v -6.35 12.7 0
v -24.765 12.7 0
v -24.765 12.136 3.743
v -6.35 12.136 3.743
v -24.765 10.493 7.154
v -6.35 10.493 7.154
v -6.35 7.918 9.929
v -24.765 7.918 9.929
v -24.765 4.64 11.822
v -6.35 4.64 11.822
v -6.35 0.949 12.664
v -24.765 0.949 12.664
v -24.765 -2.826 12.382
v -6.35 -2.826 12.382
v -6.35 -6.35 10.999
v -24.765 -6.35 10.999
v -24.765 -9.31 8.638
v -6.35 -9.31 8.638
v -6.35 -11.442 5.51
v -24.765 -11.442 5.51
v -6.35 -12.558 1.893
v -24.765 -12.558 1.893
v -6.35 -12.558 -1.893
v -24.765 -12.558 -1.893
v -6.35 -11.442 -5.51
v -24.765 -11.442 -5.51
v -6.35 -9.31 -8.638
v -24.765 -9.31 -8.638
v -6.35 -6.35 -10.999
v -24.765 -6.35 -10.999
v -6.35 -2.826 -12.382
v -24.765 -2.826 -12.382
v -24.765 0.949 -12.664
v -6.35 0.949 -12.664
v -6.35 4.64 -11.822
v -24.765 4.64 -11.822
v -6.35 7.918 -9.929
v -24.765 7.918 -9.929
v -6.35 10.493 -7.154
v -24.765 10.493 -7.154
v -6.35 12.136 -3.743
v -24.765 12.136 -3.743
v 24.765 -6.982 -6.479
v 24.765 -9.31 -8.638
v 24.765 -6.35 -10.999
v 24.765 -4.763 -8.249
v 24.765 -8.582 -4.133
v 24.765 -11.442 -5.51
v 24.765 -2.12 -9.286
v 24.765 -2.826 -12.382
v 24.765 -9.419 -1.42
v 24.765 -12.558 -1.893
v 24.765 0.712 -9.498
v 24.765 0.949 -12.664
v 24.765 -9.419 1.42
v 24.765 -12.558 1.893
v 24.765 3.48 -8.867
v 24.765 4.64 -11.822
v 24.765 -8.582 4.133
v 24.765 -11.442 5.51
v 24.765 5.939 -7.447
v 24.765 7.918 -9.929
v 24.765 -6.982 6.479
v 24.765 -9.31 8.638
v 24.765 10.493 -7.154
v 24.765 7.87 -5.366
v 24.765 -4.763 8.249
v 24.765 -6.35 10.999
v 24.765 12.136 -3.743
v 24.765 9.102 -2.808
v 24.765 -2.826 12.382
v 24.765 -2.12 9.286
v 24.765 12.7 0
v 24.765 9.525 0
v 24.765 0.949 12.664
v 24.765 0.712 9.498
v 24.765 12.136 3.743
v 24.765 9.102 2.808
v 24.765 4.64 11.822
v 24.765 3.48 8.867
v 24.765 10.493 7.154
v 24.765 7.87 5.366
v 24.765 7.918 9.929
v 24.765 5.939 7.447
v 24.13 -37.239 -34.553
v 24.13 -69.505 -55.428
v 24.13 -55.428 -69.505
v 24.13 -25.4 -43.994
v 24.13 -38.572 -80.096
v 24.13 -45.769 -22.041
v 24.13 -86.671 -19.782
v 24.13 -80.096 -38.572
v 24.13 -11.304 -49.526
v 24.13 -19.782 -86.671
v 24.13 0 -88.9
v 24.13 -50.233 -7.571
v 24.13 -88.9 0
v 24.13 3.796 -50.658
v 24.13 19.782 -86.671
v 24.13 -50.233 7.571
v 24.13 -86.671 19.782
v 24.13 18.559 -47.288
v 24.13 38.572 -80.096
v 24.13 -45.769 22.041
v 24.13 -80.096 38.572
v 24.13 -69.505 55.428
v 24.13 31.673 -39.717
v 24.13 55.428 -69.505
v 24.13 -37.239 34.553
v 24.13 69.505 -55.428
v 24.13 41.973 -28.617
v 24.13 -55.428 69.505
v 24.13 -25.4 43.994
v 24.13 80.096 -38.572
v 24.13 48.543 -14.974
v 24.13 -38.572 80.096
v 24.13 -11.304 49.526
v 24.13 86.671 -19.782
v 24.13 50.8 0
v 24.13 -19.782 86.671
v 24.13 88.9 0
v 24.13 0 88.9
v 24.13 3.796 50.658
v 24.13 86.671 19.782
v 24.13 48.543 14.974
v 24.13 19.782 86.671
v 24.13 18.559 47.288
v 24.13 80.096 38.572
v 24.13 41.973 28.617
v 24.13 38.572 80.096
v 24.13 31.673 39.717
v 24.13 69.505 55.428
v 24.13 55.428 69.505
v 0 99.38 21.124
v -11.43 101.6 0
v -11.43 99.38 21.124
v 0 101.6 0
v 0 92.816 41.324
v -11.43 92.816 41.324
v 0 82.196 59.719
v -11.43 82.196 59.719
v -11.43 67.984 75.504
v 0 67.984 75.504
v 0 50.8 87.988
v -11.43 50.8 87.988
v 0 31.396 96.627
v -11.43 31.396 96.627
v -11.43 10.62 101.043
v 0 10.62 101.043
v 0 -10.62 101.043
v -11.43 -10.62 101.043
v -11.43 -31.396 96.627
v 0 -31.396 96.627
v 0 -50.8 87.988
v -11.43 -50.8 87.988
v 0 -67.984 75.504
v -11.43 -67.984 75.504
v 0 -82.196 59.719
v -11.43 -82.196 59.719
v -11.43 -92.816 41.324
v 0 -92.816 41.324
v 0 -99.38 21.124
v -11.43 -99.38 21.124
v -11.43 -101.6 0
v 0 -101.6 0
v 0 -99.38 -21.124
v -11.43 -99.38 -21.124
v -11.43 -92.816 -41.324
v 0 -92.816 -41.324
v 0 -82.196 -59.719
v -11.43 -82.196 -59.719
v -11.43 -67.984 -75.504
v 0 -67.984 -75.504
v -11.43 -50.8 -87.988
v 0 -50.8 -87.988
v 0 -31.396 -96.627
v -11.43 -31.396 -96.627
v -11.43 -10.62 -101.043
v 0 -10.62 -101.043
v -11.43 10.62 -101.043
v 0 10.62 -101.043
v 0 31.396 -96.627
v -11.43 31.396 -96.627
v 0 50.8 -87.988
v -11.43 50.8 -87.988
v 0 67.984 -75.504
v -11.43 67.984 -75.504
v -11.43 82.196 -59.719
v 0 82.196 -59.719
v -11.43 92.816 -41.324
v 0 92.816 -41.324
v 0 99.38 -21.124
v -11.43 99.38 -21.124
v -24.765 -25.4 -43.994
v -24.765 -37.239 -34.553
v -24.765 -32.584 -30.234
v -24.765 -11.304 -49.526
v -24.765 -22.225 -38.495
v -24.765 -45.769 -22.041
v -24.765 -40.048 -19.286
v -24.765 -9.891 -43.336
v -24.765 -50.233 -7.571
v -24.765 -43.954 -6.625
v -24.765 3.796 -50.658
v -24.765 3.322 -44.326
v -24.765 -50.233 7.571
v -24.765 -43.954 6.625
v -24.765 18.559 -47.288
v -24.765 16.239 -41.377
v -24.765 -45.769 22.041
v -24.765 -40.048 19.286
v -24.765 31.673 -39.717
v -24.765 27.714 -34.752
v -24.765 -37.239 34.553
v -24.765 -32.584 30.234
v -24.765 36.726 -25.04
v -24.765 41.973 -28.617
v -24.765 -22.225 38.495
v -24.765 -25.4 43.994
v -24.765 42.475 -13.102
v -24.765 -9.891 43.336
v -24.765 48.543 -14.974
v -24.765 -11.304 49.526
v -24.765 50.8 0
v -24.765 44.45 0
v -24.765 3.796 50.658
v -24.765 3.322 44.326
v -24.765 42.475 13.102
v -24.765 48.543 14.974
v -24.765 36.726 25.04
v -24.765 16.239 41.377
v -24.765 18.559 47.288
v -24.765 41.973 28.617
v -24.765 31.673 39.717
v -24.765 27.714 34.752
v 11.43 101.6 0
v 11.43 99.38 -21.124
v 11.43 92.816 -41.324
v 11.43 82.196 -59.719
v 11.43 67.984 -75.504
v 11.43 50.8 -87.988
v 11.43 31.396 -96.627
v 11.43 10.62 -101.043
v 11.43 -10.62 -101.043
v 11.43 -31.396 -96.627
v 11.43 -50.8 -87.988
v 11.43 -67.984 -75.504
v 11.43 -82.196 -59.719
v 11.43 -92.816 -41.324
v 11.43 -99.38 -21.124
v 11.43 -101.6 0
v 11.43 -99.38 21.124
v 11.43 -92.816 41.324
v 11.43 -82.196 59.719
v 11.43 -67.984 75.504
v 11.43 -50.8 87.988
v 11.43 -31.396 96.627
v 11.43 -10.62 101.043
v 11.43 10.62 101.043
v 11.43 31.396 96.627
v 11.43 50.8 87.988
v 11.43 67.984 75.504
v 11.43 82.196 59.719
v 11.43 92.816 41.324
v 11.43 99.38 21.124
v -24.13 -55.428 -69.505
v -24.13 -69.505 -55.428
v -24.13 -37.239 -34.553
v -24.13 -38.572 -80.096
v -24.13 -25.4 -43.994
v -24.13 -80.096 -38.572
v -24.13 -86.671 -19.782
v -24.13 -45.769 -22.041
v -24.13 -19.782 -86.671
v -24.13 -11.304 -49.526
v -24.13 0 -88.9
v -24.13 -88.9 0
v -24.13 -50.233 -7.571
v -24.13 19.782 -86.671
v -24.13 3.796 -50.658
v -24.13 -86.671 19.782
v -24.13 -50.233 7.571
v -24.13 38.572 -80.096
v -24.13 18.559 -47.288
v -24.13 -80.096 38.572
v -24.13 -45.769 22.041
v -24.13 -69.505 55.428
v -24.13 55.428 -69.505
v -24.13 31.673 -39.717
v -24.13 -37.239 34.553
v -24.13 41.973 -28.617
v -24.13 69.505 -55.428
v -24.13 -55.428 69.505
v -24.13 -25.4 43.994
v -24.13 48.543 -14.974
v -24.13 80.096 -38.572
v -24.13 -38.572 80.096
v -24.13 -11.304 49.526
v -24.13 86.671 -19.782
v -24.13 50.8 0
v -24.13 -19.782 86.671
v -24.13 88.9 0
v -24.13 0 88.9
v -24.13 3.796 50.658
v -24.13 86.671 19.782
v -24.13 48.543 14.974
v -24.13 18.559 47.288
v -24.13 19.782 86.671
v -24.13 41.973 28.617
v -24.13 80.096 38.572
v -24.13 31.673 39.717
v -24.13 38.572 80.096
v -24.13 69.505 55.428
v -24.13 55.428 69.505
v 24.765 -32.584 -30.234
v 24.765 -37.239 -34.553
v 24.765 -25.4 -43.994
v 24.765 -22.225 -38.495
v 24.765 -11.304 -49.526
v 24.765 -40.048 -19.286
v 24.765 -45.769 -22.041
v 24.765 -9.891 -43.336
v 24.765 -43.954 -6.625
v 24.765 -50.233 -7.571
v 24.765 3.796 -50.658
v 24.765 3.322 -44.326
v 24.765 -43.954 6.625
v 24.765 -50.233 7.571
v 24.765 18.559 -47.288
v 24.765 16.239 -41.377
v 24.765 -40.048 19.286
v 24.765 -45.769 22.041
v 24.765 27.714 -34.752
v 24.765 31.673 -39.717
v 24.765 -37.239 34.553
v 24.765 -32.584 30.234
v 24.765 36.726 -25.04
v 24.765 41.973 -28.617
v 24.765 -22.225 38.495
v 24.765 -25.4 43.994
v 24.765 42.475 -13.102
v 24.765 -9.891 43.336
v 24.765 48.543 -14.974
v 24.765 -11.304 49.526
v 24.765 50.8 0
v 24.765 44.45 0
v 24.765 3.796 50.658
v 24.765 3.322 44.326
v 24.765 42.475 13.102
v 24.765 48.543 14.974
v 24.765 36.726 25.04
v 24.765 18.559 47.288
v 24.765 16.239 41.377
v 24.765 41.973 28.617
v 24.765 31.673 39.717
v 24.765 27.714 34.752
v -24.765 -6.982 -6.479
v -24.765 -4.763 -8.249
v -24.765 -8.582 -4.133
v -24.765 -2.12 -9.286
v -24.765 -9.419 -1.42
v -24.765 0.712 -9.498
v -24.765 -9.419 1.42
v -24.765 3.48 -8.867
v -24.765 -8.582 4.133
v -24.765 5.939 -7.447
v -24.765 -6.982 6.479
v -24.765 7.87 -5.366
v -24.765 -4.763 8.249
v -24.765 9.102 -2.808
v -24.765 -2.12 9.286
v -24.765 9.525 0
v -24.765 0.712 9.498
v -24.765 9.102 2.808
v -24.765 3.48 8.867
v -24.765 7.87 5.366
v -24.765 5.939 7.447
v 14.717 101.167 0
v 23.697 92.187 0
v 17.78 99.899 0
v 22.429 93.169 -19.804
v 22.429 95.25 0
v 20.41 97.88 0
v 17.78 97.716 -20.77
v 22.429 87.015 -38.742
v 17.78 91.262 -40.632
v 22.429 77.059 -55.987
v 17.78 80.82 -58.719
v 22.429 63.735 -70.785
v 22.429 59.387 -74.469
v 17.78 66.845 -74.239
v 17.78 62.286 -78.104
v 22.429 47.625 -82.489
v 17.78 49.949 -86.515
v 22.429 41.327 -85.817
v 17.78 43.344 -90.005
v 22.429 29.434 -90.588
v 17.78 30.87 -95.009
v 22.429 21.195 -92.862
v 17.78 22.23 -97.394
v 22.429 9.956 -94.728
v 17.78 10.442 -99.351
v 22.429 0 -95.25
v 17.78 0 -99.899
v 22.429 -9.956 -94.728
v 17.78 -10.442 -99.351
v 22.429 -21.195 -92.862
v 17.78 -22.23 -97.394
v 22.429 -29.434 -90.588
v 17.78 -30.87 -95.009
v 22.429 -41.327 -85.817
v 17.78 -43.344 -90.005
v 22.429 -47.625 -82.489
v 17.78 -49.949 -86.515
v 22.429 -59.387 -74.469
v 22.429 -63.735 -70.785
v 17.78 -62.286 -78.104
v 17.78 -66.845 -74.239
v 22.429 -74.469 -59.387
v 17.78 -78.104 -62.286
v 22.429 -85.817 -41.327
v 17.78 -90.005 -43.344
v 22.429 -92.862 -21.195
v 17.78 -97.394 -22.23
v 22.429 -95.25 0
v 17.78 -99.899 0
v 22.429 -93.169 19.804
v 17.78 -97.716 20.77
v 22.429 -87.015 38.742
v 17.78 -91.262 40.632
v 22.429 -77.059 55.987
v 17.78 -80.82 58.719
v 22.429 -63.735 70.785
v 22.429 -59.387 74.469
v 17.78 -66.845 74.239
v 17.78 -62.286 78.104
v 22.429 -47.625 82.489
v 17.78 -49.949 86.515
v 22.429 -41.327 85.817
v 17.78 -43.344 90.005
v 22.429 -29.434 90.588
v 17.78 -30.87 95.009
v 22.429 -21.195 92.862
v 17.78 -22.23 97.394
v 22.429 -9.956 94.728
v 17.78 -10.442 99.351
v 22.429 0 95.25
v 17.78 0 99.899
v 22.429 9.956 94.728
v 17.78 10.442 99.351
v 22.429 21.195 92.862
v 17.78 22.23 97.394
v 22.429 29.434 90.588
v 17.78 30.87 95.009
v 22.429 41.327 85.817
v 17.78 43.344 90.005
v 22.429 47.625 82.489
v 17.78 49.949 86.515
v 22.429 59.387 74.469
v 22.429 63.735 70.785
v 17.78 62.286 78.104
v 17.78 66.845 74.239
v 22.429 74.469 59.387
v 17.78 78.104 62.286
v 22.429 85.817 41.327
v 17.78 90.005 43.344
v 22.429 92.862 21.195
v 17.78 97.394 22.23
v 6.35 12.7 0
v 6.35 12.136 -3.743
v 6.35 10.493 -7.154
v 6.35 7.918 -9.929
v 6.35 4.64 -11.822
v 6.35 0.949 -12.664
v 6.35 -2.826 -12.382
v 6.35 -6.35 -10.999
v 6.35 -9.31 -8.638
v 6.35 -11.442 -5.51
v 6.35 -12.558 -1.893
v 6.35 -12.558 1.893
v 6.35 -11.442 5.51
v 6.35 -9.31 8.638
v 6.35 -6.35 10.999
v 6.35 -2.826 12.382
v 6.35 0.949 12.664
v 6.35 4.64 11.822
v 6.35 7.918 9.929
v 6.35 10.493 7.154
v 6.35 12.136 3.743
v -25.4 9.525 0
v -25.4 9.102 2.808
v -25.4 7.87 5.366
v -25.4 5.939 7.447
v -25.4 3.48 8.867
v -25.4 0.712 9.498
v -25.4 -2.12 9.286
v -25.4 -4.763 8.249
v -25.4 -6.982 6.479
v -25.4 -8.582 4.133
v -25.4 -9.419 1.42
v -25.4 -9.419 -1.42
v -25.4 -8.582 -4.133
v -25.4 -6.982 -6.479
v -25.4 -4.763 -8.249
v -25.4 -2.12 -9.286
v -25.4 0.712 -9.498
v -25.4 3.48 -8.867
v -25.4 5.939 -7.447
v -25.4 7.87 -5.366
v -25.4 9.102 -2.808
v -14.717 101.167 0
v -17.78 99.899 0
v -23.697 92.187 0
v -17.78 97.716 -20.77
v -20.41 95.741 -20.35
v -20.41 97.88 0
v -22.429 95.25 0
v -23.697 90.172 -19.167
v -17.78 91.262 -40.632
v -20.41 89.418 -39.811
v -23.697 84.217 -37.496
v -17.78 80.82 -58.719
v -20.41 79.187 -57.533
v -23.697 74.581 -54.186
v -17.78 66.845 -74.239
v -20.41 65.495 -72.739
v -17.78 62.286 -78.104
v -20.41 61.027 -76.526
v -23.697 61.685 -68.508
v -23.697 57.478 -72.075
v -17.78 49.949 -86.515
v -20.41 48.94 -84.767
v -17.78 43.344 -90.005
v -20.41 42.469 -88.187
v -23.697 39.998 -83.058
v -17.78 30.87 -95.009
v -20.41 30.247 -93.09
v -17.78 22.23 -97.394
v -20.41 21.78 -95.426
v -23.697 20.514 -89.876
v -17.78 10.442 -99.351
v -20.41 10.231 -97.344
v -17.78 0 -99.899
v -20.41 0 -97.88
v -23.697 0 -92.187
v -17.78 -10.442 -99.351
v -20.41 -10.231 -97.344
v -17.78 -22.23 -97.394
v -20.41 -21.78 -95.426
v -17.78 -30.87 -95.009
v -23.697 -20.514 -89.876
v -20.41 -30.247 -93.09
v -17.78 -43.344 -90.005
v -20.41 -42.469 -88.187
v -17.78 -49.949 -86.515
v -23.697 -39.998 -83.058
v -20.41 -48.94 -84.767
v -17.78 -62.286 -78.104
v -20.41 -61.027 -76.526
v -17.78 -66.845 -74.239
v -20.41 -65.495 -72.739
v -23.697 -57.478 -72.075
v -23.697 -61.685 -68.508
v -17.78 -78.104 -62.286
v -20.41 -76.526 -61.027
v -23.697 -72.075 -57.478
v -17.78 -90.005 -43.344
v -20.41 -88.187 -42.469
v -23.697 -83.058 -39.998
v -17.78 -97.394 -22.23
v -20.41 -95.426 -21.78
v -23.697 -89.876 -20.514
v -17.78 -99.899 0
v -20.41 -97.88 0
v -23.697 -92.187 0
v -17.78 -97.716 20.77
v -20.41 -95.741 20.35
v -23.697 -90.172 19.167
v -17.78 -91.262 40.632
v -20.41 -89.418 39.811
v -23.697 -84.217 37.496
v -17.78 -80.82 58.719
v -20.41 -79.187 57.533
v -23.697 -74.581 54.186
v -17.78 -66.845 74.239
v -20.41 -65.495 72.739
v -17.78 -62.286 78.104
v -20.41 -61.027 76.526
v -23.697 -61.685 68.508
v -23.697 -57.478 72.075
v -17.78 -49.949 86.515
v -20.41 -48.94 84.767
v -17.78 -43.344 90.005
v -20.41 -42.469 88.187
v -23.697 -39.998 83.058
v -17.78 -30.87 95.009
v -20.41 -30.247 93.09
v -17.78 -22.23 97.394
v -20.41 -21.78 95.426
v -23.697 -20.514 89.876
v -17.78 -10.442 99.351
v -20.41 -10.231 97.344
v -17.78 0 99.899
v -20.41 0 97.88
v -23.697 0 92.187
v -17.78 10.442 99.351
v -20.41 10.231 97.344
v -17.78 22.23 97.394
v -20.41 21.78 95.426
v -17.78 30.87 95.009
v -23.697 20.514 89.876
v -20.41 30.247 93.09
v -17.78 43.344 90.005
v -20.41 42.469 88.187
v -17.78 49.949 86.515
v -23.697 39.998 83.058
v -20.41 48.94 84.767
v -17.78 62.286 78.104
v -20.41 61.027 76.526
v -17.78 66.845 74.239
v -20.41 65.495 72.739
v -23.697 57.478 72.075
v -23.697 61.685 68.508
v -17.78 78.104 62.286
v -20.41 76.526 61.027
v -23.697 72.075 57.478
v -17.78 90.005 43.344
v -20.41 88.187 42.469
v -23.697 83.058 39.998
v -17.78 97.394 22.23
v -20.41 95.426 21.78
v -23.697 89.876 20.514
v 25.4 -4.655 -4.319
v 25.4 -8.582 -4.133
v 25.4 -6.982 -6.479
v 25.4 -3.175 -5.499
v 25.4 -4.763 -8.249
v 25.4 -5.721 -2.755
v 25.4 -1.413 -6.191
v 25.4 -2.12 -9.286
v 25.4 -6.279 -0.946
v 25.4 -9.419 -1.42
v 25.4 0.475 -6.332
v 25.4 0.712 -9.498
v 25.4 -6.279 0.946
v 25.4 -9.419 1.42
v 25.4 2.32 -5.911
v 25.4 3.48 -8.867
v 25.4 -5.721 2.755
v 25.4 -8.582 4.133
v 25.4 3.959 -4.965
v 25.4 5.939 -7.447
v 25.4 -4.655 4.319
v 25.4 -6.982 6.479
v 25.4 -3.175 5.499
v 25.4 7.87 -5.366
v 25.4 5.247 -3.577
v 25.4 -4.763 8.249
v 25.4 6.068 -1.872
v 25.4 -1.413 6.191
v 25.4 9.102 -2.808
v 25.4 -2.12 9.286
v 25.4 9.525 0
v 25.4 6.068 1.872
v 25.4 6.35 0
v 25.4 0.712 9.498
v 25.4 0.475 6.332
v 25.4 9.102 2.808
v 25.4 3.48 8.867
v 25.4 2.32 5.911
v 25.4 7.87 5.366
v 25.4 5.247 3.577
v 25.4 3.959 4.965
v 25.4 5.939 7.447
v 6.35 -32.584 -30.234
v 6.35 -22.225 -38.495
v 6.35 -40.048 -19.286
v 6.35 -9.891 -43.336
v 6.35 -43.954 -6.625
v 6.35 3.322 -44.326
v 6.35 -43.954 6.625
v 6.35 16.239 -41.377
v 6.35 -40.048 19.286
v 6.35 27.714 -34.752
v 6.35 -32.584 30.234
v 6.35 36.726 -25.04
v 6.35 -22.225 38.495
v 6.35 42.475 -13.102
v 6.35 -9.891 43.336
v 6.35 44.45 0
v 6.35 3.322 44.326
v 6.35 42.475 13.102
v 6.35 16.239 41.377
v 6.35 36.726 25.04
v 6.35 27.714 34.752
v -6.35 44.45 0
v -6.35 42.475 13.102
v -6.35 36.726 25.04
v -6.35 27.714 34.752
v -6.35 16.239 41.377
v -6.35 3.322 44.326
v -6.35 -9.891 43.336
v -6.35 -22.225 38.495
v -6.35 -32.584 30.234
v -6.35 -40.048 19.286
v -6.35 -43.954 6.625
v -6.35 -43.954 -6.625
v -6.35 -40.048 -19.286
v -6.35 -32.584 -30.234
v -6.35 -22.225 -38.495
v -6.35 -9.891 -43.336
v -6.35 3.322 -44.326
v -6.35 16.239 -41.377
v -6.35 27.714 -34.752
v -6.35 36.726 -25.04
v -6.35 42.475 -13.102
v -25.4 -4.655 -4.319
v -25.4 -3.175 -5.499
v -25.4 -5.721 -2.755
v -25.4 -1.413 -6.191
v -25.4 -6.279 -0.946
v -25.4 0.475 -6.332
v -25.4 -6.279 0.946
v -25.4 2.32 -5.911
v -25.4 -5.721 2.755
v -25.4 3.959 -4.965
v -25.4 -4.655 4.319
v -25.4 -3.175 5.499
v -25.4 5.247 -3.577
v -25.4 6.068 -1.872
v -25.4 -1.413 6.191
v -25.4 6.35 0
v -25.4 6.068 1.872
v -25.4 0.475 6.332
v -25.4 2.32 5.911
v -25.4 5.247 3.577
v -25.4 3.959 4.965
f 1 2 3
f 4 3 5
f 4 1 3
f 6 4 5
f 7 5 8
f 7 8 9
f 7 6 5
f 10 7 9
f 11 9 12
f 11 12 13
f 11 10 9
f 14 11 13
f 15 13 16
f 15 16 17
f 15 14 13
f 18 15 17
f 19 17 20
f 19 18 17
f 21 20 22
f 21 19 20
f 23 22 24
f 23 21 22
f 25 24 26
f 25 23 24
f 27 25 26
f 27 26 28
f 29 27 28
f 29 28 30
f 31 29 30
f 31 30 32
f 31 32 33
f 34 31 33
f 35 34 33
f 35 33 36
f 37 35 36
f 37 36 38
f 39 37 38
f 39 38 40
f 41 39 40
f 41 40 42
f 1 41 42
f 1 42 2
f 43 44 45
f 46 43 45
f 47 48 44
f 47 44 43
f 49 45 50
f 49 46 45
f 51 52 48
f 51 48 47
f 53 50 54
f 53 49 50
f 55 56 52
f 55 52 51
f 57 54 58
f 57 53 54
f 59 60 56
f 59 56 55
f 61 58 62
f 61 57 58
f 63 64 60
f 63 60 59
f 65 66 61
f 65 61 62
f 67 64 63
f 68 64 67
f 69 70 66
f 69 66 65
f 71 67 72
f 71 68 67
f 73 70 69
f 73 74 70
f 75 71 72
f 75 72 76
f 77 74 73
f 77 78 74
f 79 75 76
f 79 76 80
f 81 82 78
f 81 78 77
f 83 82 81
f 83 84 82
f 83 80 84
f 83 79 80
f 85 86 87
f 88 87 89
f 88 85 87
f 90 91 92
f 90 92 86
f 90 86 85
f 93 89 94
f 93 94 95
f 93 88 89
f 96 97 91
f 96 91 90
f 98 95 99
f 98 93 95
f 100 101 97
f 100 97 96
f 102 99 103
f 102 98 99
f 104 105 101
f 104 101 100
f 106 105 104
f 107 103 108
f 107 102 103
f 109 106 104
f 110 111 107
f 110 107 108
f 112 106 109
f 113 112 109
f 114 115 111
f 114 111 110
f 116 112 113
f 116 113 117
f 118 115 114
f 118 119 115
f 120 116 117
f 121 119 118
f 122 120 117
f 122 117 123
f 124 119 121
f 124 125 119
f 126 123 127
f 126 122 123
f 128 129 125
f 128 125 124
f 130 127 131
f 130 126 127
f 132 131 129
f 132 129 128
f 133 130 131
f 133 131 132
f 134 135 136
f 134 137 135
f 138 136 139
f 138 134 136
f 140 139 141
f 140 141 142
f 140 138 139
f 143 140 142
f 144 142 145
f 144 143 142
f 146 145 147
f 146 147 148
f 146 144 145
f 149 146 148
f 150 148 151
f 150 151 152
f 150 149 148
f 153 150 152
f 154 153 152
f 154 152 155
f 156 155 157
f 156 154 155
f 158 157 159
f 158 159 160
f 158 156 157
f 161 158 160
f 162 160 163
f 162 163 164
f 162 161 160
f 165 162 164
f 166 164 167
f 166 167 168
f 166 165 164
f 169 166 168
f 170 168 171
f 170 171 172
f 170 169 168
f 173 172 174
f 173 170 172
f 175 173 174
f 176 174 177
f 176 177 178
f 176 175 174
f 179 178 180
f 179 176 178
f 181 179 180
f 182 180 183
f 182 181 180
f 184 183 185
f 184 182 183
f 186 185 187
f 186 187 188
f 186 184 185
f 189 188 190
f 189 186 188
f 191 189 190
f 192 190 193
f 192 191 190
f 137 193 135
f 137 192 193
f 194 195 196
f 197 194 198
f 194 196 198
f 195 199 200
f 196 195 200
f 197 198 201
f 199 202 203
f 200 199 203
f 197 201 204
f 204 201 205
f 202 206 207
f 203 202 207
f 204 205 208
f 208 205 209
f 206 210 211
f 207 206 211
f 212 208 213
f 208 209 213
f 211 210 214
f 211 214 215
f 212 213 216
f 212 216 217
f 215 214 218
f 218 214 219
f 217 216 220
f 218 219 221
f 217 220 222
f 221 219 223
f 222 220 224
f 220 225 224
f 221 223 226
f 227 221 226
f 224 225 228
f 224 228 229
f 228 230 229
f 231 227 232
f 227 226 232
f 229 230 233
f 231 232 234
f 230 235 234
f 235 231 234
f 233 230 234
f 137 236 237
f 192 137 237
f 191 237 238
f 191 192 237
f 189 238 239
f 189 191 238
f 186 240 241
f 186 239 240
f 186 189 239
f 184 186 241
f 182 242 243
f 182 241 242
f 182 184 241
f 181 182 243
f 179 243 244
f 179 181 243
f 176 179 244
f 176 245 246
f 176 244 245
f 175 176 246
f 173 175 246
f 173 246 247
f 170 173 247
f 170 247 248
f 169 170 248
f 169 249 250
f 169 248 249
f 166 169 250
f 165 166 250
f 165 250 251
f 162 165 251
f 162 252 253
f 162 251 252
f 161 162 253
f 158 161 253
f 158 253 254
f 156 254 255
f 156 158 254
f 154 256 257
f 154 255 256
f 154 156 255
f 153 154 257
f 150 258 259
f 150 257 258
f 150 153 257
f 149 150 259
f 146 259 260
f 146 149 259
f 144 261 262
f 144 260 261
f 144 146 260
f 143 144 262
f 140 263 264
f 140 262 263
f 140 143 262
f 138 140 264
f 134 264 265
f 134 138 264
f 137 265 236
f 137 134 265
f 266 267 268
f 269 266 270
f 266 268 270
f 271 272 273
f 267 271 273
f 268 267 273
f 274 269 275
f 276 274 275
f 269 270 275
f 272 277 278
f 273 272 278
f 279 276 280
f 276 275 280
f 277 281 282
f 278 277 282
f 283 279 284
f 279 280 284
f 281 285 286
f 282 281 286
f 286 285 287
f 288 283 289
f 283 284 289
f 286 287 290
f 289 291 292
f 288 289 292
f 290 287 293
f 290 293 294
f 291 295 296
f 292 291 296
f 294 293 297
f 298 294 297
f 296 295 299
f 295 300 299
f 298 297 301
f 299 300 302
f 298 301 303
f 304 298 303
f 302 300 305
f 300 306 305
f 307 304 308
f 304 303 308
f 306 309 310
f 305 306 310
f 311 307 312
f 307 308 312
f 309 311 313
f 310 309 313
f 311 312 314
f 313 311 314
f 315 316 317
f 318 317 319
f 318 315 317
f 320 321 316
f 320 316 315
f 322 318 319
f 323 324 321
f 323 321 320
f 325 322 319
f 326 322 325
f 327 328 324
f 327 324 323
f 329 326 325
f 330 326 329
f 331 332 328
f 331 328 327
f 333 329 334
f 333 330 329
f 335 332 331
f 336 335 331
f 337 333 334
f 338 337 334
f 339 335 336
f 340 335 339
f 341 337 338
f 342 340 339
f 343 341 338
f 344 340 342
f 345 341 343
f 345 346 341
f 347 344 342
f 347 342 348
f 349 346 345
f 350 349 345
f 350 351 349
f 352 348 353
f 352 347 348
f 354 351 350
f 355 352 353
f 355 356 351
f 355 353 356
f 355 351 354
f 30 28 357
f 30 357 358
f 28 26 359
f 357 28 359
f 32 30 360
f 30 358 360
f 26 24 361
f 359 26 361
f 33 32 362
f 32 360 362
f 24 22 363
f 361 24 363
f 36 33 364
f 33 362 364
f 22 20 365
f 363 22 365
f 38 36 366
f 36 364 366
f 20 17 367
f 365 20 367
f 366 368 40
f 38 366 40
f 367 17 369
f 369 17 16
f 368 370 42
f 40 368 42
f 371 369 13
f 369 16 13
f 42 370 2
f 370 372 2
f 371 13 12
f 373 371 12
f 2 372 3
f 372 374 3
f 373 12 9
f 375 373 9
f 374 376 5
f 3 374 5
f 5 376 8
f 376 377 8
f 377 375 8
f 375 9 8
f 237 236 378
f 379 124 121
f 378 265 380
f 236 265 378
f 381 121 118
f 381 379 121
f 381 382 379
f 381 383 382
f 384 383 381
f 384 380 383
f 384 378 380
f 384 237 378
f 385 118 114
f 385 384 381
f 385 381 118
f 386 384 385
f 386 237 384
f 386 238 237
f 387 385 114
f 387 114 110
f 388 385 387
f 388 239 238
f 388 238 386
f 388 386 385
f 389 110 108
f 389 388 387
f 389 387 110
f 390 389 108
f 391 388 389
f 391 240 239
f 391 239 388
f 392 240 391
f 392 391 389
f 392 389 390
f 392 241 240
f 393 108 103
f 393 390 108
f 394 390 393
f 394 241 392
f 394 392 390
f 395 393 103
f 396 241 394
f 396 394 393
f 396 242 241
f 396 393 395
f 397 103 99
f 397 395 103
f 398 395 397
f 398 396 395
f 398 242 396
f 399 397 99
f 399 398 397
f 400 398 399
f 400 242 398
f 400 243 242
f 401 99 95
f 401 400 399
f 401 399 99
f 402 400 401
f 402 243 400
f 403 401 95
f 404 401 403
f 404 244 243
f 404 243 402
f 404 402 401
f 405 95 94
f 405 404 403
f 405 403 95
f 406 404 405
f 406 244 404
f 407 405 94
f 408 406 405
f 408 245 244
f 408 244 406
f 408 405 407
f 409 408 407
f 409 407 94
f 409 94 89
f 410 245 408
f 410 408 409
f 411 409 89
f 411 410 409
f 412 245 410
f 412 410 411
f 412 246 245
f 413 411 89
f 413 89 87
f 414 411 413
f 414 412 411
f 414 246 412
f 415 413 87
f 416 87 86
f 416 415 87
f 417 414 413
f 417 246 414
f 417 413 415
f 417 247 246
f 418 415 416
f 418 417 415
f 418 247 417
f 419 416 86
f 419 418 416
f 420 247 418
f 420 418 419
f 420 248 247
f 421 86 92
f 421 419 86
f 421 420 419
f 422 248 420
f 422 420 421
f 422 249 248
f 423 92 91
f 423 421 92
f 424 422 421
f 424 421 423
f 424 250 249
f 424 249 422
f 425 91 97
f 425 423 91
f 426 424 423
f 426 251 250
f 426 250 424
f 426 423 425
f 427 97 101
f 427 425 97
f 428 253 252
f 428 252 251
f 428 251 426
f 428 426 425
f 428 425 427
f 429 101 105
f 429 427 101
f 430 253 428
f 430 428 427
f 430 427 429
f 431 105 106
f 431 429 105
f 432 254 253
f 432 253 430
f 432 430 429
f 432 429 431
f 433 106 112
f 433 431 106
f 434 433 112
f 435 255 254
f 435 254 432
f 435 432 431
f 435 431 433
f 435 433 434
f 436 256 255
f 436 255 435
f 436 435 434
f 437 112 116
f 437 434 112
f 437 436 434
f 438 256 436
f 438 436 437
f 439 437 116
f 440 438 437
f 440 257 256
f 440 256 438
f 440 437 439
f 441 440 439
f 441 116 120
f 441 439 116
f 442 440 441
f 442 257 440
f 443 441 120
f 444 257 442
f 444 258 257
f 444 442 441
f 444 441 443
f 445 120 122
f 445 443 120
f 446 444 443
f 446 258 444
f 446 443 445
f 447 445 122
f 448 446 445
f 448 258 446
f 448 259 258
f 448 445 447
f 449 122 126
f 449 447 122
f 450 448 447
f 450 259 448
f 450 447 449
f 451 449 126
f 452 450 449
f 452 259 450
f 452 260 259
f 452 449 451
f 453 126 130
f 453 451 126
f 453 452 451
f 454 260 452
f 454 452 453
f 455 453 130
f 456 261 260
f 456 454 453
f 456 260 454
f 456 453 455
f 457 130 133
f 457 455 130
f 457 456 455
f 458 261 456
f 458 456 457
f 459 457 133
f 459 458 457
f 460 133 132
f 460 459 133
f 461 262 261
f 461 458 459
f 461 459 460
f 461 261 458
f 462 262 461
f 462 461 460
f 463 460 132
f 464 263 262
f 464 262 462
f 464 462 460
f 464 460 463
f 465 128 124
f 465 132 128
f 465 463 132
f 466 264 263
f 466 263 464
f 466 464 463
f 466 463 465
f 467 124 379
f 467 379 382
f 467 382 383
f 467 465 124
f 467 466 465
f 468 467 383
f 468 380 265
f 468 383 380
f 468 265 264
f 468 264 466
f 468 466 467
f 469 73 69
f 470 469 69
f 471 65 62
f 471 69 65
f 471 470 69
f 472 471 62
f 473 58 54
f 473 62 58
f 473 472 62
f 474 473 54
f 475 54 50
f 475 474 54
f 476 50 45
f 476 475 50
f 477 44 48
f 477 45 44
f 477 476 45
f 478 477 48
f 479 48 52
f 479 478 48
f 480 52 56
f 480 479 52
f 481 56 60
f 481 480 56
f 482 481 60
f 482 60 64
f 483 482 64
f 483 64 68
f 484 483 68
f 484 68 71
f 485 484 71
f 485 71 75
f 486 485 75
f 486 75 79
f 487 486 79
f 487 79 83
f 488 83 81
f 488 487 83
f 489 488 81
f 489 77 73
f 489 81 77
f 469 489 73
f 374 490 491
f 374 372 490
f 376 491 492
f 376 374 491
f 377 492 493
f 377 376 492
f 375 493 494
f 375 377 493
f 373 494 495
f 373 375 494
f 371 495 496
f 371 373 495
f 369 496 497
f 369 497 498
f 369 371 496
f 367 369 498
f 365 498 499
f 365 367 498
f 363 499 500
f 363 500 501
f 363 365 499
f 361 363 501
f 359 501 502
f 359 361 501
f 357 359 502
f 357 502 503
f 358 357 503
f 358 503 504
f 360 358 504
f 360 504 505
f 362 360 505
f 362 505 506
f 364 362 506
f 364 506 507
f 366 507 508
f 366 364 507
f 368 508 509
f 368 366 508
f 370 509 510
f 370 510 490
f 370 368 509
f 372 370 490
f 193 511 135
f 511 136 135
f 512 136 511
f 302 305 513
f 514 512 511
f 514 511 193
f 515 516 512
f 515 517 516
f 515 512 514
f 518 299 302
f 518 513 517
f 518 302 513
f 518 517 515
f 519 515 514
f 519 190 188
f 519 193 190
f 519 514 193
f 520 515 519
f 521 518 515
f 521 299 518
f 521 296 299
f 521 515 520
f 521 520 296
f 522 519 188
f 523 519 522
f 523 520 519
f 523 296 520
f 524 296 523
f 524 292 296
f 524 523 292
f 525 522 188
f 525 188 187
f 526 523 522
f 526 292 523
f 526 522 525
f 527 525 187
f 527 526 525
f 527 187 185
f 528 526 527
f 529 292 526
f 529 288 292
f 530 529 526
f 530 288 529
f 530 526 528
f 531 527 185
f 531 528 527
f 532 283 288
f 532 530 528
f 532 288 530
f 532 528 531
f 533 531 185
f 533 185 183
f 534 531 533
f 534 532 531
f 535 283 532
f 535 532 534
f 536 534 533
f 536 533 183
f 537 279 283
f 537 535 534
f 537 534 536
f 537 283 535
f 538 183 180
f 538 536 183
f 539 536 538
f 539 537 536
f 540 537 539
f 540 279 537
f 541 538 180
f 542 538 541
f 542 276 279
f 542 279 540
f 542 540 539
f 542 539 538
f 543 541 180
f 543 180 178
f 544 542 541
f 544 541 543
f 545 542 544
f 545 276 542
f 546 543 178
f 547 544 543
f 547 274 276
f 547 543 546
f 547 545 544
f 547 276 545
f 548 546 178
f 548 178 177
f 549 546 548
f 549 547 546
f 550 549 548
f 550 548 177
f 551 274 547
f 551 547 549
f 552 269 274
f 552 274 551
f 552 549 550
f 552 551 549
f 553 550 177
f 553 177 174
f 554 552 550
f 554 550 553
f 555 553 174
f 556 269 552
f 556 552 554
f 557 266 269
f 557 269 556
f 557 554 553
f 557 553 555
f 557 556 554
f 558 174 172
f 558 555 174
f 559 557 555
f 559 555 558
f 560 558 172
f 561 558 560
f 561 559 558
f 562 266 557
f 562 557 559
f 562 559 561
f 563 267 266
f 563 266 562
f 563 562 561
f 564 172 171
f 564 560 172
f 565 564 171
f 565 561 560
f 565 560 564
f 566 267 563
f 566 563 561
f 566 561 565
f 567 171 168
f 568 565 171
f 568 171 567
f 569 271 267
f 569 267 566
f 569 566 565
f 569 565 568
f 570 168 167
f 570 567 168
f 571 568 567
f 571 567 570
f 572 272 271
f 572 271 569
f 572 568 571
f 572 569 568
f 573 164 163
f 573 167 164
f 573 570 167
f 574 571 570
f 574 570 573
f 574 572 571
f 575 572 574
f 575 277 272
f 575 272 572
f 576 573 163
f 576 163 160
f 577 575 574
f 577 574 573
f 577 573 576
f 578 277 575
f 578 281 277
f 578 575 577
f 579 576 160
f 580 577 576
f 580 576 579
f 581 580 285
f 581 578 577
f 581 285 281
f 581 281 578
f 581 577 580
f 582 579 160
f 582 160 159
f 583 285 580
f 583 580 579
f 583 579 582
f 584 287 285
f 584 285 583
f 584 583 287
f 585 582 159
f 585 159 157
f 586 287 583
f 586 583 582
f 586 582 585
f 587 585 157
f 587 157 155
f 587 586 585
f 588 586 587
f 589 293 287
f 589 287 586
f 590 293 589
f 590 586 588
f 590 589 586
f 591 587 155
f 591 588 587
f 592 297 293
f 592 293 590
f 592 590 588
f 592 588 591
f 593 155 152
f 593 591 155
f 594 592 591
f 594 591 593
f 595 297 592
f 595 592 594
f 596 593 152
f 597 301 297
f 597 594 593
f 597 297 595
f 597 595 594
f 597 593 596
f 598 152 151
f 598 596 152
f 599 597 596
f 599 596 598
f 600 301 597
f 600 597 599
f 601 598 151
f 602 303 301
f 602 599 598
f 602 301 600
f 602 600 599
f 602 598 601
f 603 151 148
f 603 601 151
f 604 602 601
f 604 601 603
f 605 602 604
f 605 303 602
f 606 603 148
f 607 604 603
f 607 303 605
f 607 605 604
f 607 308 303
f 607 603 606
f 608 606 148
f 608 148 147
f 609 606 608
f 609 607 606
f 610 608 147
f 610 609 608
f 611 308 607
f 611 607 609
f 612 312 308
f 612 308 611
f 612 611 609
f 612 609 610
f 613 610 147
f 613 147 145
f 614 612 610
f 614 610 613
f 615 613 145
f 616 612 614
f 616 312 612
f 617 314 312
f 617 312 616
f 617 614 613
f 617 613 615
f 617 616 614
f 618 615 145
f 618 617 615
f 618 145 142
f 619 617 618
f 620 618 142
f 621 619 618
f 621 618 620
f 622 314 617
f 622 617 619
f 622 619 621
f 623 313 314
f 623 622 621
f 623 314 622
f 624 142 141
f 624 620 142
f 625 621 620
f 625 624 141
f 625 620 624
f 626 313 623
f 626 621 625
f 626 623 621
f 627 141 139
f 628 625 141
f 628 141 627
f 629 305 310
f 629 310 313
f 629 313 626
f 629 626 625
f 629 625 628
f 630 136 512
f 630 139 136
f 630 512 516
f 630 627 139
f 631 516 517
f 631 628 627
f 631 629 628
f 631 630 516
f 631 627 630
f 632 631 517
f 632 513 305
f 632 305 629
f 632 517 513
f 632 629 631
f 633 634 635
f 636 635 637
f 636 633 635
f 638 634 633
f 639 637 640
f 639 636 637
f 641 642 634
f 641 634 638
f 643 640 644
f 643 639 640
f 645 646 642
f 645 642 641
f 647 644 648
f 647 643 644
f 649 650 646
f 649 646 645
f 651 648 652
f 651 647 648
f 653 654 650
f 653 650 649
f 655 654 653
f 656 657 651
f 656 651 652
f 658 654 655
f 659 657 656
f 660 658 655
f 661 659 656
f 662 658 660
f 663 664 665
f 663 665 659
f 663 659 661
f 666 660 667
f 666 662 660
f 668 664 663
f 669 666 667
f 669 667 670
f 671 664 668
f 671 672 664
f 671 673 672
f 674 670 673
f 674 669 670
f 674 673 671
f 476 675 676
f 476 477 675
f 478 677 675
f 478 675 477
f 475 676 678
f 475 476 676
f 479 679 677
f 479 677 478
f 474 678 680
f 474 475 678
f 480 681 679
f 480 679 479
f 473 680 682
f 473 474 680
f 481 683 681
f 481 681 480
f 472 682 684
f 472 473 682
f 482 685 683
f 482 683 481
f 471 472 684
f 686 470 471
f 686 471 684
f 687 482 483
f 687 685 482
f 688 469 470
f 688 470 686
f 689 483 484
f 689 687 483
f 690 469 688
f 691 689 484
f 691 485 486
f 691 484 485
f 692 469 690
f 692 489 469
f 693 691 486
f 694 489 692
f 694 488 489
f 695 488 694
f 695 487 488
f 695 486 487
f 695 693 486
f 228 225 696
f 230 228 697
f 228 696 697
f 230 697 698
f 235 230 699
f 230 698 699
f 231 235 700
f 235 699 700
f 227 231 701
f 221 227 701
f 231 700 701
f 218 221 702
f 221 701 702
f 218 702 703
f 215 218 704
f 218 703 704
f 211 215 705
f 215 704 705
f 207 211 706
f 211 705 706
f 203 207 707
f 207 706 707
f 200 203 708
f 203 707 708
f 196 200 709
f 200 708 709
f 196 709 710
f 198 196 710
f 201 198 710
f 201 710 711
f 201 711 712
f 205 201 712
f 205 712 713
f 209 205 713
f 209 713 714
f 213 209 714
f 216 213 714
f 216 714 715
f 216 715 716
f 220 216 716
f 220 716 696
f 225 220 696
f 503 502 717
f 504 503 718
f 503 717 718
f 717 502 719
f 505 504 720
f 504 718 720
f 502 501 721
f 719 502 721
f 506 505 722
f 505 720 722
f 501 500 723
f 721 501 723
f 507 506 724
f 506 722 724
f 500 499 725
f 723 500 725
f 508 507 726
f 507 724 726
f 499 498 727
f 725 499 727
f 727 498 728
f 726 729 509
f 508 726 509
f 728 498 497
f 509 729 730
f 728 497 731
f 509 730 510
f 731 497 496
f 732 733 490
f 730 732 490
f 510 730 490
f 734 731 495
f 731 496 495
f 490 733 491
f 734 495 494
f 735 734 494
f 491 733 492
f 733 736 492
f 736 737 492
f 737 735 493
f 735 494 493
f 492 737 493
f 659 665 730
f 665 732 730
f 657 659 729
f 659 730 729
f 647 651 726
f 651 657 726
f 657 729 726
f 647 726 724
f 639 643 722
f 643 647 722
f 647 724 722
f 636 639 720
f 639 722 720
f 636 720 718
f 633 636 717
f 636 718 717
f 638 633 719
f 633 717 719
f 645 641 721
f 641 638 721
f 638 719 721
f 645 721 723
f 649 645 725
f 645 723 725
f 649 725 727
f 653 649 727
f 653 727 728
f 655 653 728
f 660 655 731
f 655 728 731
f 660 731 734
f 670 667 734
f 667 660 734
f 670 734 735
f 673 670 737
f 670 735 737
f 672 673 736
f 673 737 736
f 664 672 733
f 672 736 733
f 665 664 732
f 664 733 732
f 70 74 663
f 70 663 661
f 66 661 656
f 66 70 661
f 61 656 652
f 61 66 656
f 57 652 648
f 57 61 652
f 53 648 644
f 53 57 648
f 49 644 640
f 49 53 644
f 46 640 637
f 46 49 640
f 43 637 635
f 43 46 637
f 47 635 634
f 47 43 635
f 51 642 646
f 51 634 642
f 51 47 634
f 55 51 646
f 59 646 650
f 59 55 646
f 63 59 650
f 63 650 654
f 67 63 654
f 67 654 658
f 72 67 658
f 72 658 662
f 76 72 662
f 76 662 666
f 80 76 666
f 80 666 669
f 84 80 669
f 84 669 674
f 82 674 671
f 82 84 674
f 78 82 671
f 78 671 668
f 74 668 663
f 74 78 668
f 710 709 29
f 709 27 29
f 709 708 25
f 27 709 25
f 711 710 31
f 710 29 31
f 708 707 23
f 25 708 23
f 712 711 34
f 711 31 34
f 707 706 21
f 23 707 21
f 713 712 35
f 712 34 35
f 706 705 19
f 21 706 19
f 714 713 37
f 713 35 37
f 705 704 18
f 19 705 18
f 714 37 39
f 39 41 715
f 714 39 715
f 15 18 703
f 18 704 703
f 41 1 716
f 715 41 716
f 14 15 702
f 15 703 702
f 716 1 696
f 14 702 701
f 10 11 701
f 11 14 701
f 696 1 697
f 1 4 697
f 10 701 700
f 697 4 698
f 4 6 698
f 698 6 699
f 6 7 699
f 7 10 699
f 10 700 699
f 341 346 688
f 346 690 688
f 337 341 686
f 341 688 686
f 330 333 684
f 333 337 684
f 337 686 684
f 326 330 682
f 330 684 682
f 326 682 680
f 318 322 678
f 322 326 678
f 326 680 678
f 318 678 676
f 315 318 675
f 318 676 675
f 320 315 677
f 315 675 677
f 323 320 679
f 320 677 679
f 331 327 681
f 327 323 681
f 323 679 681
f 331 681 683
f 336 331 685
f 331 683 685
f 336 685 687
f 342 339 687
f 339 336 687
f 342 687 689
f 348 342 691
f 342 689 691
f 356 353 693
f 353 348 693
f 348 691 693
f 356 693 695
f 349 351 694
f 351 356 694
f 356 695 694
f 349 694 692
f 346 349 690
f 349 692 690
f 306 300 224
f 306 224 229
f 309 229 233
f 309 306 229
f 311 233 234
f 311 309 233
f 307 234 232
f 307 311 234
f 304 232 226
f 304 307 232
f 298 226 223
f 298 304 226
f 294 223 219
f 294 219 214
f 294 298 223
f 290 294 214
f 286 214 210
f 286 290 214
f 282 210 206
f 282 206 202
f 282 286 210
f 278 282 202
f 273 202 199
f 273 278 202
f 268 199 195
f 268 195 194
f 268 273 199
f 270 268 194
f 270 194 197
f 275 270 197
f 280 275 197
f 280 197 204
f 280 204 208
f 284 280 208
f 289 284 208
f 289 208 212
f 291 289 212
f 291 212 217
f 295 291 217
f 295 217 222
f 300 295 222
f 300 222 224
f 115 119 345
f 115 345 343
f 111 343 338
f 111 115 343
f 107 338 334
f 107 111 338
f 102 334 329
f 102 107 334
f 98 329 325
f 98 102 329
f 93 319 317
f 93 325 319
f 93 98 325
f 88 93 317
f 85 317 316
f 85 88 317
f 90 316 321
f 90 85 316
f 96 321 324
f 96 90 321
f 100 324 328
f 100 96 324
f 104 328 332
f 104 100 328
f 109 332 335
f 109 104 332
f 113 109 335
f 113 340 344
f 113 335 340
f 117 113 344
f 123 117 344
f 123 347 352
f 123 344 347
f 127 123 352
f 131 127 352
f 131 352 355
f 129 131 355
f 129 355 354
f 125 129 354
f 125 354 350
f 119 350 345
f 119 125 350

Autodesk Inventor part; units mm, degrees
ref_plane "YZ Plane" through (0, 0, 0) normal (1, 0, 0) x (0, 1, 0)
ref_plane "XZ Plane" through (0, 0, 0) normal (0, 1, 0) x (-1, 0, 0)
ref_plane "XY Plane" through (0, 0, 0) normal (0, 0, 1) x (1, 0, 0)
sketch "Sketch3" plane through (0, 0, 0) normal (1, 0, 0) x (0, 1, 0)
  circle A0 centre (0, 0) radius 12.7
  circle A1 centre (0, 0) radius 50.8
  circle A2 centre (0, 0) radius 101.6
  circle A3 centre (0, 0) radius 44.45
  circle A4 centre (0, 0) radius 9.525
  circle A5 centre (0, 0) radius 6.35
  dimension "d10" = 25.4
  dimension "d11" = 101.6
  dimension "d12" = 203.2
  dimension "d13" = 88.9
  dimension "d14" = 19.05
  dimension "d15" = 12.7
extrude "Extrusion4" add sketch "Sketch3" along normal mid plane 49.53 contours A0 | A1
extrude "Extrusion5" add sketch "Sketch3" along normal mid plane 12.7 contours A3
extrude "Extrusion6" add sketch "Sketch3" along normal mid plane 48.26 contours A2
extrude "Extrusion7" add sketch "Sketch3" along normal mid plane 50.8 contours A4
fillet "Fillet1" radius 12.7 2 edges at (24.13, -101.6, 0) (-24.13, -101.6, 0)
properties part number "wheel"
